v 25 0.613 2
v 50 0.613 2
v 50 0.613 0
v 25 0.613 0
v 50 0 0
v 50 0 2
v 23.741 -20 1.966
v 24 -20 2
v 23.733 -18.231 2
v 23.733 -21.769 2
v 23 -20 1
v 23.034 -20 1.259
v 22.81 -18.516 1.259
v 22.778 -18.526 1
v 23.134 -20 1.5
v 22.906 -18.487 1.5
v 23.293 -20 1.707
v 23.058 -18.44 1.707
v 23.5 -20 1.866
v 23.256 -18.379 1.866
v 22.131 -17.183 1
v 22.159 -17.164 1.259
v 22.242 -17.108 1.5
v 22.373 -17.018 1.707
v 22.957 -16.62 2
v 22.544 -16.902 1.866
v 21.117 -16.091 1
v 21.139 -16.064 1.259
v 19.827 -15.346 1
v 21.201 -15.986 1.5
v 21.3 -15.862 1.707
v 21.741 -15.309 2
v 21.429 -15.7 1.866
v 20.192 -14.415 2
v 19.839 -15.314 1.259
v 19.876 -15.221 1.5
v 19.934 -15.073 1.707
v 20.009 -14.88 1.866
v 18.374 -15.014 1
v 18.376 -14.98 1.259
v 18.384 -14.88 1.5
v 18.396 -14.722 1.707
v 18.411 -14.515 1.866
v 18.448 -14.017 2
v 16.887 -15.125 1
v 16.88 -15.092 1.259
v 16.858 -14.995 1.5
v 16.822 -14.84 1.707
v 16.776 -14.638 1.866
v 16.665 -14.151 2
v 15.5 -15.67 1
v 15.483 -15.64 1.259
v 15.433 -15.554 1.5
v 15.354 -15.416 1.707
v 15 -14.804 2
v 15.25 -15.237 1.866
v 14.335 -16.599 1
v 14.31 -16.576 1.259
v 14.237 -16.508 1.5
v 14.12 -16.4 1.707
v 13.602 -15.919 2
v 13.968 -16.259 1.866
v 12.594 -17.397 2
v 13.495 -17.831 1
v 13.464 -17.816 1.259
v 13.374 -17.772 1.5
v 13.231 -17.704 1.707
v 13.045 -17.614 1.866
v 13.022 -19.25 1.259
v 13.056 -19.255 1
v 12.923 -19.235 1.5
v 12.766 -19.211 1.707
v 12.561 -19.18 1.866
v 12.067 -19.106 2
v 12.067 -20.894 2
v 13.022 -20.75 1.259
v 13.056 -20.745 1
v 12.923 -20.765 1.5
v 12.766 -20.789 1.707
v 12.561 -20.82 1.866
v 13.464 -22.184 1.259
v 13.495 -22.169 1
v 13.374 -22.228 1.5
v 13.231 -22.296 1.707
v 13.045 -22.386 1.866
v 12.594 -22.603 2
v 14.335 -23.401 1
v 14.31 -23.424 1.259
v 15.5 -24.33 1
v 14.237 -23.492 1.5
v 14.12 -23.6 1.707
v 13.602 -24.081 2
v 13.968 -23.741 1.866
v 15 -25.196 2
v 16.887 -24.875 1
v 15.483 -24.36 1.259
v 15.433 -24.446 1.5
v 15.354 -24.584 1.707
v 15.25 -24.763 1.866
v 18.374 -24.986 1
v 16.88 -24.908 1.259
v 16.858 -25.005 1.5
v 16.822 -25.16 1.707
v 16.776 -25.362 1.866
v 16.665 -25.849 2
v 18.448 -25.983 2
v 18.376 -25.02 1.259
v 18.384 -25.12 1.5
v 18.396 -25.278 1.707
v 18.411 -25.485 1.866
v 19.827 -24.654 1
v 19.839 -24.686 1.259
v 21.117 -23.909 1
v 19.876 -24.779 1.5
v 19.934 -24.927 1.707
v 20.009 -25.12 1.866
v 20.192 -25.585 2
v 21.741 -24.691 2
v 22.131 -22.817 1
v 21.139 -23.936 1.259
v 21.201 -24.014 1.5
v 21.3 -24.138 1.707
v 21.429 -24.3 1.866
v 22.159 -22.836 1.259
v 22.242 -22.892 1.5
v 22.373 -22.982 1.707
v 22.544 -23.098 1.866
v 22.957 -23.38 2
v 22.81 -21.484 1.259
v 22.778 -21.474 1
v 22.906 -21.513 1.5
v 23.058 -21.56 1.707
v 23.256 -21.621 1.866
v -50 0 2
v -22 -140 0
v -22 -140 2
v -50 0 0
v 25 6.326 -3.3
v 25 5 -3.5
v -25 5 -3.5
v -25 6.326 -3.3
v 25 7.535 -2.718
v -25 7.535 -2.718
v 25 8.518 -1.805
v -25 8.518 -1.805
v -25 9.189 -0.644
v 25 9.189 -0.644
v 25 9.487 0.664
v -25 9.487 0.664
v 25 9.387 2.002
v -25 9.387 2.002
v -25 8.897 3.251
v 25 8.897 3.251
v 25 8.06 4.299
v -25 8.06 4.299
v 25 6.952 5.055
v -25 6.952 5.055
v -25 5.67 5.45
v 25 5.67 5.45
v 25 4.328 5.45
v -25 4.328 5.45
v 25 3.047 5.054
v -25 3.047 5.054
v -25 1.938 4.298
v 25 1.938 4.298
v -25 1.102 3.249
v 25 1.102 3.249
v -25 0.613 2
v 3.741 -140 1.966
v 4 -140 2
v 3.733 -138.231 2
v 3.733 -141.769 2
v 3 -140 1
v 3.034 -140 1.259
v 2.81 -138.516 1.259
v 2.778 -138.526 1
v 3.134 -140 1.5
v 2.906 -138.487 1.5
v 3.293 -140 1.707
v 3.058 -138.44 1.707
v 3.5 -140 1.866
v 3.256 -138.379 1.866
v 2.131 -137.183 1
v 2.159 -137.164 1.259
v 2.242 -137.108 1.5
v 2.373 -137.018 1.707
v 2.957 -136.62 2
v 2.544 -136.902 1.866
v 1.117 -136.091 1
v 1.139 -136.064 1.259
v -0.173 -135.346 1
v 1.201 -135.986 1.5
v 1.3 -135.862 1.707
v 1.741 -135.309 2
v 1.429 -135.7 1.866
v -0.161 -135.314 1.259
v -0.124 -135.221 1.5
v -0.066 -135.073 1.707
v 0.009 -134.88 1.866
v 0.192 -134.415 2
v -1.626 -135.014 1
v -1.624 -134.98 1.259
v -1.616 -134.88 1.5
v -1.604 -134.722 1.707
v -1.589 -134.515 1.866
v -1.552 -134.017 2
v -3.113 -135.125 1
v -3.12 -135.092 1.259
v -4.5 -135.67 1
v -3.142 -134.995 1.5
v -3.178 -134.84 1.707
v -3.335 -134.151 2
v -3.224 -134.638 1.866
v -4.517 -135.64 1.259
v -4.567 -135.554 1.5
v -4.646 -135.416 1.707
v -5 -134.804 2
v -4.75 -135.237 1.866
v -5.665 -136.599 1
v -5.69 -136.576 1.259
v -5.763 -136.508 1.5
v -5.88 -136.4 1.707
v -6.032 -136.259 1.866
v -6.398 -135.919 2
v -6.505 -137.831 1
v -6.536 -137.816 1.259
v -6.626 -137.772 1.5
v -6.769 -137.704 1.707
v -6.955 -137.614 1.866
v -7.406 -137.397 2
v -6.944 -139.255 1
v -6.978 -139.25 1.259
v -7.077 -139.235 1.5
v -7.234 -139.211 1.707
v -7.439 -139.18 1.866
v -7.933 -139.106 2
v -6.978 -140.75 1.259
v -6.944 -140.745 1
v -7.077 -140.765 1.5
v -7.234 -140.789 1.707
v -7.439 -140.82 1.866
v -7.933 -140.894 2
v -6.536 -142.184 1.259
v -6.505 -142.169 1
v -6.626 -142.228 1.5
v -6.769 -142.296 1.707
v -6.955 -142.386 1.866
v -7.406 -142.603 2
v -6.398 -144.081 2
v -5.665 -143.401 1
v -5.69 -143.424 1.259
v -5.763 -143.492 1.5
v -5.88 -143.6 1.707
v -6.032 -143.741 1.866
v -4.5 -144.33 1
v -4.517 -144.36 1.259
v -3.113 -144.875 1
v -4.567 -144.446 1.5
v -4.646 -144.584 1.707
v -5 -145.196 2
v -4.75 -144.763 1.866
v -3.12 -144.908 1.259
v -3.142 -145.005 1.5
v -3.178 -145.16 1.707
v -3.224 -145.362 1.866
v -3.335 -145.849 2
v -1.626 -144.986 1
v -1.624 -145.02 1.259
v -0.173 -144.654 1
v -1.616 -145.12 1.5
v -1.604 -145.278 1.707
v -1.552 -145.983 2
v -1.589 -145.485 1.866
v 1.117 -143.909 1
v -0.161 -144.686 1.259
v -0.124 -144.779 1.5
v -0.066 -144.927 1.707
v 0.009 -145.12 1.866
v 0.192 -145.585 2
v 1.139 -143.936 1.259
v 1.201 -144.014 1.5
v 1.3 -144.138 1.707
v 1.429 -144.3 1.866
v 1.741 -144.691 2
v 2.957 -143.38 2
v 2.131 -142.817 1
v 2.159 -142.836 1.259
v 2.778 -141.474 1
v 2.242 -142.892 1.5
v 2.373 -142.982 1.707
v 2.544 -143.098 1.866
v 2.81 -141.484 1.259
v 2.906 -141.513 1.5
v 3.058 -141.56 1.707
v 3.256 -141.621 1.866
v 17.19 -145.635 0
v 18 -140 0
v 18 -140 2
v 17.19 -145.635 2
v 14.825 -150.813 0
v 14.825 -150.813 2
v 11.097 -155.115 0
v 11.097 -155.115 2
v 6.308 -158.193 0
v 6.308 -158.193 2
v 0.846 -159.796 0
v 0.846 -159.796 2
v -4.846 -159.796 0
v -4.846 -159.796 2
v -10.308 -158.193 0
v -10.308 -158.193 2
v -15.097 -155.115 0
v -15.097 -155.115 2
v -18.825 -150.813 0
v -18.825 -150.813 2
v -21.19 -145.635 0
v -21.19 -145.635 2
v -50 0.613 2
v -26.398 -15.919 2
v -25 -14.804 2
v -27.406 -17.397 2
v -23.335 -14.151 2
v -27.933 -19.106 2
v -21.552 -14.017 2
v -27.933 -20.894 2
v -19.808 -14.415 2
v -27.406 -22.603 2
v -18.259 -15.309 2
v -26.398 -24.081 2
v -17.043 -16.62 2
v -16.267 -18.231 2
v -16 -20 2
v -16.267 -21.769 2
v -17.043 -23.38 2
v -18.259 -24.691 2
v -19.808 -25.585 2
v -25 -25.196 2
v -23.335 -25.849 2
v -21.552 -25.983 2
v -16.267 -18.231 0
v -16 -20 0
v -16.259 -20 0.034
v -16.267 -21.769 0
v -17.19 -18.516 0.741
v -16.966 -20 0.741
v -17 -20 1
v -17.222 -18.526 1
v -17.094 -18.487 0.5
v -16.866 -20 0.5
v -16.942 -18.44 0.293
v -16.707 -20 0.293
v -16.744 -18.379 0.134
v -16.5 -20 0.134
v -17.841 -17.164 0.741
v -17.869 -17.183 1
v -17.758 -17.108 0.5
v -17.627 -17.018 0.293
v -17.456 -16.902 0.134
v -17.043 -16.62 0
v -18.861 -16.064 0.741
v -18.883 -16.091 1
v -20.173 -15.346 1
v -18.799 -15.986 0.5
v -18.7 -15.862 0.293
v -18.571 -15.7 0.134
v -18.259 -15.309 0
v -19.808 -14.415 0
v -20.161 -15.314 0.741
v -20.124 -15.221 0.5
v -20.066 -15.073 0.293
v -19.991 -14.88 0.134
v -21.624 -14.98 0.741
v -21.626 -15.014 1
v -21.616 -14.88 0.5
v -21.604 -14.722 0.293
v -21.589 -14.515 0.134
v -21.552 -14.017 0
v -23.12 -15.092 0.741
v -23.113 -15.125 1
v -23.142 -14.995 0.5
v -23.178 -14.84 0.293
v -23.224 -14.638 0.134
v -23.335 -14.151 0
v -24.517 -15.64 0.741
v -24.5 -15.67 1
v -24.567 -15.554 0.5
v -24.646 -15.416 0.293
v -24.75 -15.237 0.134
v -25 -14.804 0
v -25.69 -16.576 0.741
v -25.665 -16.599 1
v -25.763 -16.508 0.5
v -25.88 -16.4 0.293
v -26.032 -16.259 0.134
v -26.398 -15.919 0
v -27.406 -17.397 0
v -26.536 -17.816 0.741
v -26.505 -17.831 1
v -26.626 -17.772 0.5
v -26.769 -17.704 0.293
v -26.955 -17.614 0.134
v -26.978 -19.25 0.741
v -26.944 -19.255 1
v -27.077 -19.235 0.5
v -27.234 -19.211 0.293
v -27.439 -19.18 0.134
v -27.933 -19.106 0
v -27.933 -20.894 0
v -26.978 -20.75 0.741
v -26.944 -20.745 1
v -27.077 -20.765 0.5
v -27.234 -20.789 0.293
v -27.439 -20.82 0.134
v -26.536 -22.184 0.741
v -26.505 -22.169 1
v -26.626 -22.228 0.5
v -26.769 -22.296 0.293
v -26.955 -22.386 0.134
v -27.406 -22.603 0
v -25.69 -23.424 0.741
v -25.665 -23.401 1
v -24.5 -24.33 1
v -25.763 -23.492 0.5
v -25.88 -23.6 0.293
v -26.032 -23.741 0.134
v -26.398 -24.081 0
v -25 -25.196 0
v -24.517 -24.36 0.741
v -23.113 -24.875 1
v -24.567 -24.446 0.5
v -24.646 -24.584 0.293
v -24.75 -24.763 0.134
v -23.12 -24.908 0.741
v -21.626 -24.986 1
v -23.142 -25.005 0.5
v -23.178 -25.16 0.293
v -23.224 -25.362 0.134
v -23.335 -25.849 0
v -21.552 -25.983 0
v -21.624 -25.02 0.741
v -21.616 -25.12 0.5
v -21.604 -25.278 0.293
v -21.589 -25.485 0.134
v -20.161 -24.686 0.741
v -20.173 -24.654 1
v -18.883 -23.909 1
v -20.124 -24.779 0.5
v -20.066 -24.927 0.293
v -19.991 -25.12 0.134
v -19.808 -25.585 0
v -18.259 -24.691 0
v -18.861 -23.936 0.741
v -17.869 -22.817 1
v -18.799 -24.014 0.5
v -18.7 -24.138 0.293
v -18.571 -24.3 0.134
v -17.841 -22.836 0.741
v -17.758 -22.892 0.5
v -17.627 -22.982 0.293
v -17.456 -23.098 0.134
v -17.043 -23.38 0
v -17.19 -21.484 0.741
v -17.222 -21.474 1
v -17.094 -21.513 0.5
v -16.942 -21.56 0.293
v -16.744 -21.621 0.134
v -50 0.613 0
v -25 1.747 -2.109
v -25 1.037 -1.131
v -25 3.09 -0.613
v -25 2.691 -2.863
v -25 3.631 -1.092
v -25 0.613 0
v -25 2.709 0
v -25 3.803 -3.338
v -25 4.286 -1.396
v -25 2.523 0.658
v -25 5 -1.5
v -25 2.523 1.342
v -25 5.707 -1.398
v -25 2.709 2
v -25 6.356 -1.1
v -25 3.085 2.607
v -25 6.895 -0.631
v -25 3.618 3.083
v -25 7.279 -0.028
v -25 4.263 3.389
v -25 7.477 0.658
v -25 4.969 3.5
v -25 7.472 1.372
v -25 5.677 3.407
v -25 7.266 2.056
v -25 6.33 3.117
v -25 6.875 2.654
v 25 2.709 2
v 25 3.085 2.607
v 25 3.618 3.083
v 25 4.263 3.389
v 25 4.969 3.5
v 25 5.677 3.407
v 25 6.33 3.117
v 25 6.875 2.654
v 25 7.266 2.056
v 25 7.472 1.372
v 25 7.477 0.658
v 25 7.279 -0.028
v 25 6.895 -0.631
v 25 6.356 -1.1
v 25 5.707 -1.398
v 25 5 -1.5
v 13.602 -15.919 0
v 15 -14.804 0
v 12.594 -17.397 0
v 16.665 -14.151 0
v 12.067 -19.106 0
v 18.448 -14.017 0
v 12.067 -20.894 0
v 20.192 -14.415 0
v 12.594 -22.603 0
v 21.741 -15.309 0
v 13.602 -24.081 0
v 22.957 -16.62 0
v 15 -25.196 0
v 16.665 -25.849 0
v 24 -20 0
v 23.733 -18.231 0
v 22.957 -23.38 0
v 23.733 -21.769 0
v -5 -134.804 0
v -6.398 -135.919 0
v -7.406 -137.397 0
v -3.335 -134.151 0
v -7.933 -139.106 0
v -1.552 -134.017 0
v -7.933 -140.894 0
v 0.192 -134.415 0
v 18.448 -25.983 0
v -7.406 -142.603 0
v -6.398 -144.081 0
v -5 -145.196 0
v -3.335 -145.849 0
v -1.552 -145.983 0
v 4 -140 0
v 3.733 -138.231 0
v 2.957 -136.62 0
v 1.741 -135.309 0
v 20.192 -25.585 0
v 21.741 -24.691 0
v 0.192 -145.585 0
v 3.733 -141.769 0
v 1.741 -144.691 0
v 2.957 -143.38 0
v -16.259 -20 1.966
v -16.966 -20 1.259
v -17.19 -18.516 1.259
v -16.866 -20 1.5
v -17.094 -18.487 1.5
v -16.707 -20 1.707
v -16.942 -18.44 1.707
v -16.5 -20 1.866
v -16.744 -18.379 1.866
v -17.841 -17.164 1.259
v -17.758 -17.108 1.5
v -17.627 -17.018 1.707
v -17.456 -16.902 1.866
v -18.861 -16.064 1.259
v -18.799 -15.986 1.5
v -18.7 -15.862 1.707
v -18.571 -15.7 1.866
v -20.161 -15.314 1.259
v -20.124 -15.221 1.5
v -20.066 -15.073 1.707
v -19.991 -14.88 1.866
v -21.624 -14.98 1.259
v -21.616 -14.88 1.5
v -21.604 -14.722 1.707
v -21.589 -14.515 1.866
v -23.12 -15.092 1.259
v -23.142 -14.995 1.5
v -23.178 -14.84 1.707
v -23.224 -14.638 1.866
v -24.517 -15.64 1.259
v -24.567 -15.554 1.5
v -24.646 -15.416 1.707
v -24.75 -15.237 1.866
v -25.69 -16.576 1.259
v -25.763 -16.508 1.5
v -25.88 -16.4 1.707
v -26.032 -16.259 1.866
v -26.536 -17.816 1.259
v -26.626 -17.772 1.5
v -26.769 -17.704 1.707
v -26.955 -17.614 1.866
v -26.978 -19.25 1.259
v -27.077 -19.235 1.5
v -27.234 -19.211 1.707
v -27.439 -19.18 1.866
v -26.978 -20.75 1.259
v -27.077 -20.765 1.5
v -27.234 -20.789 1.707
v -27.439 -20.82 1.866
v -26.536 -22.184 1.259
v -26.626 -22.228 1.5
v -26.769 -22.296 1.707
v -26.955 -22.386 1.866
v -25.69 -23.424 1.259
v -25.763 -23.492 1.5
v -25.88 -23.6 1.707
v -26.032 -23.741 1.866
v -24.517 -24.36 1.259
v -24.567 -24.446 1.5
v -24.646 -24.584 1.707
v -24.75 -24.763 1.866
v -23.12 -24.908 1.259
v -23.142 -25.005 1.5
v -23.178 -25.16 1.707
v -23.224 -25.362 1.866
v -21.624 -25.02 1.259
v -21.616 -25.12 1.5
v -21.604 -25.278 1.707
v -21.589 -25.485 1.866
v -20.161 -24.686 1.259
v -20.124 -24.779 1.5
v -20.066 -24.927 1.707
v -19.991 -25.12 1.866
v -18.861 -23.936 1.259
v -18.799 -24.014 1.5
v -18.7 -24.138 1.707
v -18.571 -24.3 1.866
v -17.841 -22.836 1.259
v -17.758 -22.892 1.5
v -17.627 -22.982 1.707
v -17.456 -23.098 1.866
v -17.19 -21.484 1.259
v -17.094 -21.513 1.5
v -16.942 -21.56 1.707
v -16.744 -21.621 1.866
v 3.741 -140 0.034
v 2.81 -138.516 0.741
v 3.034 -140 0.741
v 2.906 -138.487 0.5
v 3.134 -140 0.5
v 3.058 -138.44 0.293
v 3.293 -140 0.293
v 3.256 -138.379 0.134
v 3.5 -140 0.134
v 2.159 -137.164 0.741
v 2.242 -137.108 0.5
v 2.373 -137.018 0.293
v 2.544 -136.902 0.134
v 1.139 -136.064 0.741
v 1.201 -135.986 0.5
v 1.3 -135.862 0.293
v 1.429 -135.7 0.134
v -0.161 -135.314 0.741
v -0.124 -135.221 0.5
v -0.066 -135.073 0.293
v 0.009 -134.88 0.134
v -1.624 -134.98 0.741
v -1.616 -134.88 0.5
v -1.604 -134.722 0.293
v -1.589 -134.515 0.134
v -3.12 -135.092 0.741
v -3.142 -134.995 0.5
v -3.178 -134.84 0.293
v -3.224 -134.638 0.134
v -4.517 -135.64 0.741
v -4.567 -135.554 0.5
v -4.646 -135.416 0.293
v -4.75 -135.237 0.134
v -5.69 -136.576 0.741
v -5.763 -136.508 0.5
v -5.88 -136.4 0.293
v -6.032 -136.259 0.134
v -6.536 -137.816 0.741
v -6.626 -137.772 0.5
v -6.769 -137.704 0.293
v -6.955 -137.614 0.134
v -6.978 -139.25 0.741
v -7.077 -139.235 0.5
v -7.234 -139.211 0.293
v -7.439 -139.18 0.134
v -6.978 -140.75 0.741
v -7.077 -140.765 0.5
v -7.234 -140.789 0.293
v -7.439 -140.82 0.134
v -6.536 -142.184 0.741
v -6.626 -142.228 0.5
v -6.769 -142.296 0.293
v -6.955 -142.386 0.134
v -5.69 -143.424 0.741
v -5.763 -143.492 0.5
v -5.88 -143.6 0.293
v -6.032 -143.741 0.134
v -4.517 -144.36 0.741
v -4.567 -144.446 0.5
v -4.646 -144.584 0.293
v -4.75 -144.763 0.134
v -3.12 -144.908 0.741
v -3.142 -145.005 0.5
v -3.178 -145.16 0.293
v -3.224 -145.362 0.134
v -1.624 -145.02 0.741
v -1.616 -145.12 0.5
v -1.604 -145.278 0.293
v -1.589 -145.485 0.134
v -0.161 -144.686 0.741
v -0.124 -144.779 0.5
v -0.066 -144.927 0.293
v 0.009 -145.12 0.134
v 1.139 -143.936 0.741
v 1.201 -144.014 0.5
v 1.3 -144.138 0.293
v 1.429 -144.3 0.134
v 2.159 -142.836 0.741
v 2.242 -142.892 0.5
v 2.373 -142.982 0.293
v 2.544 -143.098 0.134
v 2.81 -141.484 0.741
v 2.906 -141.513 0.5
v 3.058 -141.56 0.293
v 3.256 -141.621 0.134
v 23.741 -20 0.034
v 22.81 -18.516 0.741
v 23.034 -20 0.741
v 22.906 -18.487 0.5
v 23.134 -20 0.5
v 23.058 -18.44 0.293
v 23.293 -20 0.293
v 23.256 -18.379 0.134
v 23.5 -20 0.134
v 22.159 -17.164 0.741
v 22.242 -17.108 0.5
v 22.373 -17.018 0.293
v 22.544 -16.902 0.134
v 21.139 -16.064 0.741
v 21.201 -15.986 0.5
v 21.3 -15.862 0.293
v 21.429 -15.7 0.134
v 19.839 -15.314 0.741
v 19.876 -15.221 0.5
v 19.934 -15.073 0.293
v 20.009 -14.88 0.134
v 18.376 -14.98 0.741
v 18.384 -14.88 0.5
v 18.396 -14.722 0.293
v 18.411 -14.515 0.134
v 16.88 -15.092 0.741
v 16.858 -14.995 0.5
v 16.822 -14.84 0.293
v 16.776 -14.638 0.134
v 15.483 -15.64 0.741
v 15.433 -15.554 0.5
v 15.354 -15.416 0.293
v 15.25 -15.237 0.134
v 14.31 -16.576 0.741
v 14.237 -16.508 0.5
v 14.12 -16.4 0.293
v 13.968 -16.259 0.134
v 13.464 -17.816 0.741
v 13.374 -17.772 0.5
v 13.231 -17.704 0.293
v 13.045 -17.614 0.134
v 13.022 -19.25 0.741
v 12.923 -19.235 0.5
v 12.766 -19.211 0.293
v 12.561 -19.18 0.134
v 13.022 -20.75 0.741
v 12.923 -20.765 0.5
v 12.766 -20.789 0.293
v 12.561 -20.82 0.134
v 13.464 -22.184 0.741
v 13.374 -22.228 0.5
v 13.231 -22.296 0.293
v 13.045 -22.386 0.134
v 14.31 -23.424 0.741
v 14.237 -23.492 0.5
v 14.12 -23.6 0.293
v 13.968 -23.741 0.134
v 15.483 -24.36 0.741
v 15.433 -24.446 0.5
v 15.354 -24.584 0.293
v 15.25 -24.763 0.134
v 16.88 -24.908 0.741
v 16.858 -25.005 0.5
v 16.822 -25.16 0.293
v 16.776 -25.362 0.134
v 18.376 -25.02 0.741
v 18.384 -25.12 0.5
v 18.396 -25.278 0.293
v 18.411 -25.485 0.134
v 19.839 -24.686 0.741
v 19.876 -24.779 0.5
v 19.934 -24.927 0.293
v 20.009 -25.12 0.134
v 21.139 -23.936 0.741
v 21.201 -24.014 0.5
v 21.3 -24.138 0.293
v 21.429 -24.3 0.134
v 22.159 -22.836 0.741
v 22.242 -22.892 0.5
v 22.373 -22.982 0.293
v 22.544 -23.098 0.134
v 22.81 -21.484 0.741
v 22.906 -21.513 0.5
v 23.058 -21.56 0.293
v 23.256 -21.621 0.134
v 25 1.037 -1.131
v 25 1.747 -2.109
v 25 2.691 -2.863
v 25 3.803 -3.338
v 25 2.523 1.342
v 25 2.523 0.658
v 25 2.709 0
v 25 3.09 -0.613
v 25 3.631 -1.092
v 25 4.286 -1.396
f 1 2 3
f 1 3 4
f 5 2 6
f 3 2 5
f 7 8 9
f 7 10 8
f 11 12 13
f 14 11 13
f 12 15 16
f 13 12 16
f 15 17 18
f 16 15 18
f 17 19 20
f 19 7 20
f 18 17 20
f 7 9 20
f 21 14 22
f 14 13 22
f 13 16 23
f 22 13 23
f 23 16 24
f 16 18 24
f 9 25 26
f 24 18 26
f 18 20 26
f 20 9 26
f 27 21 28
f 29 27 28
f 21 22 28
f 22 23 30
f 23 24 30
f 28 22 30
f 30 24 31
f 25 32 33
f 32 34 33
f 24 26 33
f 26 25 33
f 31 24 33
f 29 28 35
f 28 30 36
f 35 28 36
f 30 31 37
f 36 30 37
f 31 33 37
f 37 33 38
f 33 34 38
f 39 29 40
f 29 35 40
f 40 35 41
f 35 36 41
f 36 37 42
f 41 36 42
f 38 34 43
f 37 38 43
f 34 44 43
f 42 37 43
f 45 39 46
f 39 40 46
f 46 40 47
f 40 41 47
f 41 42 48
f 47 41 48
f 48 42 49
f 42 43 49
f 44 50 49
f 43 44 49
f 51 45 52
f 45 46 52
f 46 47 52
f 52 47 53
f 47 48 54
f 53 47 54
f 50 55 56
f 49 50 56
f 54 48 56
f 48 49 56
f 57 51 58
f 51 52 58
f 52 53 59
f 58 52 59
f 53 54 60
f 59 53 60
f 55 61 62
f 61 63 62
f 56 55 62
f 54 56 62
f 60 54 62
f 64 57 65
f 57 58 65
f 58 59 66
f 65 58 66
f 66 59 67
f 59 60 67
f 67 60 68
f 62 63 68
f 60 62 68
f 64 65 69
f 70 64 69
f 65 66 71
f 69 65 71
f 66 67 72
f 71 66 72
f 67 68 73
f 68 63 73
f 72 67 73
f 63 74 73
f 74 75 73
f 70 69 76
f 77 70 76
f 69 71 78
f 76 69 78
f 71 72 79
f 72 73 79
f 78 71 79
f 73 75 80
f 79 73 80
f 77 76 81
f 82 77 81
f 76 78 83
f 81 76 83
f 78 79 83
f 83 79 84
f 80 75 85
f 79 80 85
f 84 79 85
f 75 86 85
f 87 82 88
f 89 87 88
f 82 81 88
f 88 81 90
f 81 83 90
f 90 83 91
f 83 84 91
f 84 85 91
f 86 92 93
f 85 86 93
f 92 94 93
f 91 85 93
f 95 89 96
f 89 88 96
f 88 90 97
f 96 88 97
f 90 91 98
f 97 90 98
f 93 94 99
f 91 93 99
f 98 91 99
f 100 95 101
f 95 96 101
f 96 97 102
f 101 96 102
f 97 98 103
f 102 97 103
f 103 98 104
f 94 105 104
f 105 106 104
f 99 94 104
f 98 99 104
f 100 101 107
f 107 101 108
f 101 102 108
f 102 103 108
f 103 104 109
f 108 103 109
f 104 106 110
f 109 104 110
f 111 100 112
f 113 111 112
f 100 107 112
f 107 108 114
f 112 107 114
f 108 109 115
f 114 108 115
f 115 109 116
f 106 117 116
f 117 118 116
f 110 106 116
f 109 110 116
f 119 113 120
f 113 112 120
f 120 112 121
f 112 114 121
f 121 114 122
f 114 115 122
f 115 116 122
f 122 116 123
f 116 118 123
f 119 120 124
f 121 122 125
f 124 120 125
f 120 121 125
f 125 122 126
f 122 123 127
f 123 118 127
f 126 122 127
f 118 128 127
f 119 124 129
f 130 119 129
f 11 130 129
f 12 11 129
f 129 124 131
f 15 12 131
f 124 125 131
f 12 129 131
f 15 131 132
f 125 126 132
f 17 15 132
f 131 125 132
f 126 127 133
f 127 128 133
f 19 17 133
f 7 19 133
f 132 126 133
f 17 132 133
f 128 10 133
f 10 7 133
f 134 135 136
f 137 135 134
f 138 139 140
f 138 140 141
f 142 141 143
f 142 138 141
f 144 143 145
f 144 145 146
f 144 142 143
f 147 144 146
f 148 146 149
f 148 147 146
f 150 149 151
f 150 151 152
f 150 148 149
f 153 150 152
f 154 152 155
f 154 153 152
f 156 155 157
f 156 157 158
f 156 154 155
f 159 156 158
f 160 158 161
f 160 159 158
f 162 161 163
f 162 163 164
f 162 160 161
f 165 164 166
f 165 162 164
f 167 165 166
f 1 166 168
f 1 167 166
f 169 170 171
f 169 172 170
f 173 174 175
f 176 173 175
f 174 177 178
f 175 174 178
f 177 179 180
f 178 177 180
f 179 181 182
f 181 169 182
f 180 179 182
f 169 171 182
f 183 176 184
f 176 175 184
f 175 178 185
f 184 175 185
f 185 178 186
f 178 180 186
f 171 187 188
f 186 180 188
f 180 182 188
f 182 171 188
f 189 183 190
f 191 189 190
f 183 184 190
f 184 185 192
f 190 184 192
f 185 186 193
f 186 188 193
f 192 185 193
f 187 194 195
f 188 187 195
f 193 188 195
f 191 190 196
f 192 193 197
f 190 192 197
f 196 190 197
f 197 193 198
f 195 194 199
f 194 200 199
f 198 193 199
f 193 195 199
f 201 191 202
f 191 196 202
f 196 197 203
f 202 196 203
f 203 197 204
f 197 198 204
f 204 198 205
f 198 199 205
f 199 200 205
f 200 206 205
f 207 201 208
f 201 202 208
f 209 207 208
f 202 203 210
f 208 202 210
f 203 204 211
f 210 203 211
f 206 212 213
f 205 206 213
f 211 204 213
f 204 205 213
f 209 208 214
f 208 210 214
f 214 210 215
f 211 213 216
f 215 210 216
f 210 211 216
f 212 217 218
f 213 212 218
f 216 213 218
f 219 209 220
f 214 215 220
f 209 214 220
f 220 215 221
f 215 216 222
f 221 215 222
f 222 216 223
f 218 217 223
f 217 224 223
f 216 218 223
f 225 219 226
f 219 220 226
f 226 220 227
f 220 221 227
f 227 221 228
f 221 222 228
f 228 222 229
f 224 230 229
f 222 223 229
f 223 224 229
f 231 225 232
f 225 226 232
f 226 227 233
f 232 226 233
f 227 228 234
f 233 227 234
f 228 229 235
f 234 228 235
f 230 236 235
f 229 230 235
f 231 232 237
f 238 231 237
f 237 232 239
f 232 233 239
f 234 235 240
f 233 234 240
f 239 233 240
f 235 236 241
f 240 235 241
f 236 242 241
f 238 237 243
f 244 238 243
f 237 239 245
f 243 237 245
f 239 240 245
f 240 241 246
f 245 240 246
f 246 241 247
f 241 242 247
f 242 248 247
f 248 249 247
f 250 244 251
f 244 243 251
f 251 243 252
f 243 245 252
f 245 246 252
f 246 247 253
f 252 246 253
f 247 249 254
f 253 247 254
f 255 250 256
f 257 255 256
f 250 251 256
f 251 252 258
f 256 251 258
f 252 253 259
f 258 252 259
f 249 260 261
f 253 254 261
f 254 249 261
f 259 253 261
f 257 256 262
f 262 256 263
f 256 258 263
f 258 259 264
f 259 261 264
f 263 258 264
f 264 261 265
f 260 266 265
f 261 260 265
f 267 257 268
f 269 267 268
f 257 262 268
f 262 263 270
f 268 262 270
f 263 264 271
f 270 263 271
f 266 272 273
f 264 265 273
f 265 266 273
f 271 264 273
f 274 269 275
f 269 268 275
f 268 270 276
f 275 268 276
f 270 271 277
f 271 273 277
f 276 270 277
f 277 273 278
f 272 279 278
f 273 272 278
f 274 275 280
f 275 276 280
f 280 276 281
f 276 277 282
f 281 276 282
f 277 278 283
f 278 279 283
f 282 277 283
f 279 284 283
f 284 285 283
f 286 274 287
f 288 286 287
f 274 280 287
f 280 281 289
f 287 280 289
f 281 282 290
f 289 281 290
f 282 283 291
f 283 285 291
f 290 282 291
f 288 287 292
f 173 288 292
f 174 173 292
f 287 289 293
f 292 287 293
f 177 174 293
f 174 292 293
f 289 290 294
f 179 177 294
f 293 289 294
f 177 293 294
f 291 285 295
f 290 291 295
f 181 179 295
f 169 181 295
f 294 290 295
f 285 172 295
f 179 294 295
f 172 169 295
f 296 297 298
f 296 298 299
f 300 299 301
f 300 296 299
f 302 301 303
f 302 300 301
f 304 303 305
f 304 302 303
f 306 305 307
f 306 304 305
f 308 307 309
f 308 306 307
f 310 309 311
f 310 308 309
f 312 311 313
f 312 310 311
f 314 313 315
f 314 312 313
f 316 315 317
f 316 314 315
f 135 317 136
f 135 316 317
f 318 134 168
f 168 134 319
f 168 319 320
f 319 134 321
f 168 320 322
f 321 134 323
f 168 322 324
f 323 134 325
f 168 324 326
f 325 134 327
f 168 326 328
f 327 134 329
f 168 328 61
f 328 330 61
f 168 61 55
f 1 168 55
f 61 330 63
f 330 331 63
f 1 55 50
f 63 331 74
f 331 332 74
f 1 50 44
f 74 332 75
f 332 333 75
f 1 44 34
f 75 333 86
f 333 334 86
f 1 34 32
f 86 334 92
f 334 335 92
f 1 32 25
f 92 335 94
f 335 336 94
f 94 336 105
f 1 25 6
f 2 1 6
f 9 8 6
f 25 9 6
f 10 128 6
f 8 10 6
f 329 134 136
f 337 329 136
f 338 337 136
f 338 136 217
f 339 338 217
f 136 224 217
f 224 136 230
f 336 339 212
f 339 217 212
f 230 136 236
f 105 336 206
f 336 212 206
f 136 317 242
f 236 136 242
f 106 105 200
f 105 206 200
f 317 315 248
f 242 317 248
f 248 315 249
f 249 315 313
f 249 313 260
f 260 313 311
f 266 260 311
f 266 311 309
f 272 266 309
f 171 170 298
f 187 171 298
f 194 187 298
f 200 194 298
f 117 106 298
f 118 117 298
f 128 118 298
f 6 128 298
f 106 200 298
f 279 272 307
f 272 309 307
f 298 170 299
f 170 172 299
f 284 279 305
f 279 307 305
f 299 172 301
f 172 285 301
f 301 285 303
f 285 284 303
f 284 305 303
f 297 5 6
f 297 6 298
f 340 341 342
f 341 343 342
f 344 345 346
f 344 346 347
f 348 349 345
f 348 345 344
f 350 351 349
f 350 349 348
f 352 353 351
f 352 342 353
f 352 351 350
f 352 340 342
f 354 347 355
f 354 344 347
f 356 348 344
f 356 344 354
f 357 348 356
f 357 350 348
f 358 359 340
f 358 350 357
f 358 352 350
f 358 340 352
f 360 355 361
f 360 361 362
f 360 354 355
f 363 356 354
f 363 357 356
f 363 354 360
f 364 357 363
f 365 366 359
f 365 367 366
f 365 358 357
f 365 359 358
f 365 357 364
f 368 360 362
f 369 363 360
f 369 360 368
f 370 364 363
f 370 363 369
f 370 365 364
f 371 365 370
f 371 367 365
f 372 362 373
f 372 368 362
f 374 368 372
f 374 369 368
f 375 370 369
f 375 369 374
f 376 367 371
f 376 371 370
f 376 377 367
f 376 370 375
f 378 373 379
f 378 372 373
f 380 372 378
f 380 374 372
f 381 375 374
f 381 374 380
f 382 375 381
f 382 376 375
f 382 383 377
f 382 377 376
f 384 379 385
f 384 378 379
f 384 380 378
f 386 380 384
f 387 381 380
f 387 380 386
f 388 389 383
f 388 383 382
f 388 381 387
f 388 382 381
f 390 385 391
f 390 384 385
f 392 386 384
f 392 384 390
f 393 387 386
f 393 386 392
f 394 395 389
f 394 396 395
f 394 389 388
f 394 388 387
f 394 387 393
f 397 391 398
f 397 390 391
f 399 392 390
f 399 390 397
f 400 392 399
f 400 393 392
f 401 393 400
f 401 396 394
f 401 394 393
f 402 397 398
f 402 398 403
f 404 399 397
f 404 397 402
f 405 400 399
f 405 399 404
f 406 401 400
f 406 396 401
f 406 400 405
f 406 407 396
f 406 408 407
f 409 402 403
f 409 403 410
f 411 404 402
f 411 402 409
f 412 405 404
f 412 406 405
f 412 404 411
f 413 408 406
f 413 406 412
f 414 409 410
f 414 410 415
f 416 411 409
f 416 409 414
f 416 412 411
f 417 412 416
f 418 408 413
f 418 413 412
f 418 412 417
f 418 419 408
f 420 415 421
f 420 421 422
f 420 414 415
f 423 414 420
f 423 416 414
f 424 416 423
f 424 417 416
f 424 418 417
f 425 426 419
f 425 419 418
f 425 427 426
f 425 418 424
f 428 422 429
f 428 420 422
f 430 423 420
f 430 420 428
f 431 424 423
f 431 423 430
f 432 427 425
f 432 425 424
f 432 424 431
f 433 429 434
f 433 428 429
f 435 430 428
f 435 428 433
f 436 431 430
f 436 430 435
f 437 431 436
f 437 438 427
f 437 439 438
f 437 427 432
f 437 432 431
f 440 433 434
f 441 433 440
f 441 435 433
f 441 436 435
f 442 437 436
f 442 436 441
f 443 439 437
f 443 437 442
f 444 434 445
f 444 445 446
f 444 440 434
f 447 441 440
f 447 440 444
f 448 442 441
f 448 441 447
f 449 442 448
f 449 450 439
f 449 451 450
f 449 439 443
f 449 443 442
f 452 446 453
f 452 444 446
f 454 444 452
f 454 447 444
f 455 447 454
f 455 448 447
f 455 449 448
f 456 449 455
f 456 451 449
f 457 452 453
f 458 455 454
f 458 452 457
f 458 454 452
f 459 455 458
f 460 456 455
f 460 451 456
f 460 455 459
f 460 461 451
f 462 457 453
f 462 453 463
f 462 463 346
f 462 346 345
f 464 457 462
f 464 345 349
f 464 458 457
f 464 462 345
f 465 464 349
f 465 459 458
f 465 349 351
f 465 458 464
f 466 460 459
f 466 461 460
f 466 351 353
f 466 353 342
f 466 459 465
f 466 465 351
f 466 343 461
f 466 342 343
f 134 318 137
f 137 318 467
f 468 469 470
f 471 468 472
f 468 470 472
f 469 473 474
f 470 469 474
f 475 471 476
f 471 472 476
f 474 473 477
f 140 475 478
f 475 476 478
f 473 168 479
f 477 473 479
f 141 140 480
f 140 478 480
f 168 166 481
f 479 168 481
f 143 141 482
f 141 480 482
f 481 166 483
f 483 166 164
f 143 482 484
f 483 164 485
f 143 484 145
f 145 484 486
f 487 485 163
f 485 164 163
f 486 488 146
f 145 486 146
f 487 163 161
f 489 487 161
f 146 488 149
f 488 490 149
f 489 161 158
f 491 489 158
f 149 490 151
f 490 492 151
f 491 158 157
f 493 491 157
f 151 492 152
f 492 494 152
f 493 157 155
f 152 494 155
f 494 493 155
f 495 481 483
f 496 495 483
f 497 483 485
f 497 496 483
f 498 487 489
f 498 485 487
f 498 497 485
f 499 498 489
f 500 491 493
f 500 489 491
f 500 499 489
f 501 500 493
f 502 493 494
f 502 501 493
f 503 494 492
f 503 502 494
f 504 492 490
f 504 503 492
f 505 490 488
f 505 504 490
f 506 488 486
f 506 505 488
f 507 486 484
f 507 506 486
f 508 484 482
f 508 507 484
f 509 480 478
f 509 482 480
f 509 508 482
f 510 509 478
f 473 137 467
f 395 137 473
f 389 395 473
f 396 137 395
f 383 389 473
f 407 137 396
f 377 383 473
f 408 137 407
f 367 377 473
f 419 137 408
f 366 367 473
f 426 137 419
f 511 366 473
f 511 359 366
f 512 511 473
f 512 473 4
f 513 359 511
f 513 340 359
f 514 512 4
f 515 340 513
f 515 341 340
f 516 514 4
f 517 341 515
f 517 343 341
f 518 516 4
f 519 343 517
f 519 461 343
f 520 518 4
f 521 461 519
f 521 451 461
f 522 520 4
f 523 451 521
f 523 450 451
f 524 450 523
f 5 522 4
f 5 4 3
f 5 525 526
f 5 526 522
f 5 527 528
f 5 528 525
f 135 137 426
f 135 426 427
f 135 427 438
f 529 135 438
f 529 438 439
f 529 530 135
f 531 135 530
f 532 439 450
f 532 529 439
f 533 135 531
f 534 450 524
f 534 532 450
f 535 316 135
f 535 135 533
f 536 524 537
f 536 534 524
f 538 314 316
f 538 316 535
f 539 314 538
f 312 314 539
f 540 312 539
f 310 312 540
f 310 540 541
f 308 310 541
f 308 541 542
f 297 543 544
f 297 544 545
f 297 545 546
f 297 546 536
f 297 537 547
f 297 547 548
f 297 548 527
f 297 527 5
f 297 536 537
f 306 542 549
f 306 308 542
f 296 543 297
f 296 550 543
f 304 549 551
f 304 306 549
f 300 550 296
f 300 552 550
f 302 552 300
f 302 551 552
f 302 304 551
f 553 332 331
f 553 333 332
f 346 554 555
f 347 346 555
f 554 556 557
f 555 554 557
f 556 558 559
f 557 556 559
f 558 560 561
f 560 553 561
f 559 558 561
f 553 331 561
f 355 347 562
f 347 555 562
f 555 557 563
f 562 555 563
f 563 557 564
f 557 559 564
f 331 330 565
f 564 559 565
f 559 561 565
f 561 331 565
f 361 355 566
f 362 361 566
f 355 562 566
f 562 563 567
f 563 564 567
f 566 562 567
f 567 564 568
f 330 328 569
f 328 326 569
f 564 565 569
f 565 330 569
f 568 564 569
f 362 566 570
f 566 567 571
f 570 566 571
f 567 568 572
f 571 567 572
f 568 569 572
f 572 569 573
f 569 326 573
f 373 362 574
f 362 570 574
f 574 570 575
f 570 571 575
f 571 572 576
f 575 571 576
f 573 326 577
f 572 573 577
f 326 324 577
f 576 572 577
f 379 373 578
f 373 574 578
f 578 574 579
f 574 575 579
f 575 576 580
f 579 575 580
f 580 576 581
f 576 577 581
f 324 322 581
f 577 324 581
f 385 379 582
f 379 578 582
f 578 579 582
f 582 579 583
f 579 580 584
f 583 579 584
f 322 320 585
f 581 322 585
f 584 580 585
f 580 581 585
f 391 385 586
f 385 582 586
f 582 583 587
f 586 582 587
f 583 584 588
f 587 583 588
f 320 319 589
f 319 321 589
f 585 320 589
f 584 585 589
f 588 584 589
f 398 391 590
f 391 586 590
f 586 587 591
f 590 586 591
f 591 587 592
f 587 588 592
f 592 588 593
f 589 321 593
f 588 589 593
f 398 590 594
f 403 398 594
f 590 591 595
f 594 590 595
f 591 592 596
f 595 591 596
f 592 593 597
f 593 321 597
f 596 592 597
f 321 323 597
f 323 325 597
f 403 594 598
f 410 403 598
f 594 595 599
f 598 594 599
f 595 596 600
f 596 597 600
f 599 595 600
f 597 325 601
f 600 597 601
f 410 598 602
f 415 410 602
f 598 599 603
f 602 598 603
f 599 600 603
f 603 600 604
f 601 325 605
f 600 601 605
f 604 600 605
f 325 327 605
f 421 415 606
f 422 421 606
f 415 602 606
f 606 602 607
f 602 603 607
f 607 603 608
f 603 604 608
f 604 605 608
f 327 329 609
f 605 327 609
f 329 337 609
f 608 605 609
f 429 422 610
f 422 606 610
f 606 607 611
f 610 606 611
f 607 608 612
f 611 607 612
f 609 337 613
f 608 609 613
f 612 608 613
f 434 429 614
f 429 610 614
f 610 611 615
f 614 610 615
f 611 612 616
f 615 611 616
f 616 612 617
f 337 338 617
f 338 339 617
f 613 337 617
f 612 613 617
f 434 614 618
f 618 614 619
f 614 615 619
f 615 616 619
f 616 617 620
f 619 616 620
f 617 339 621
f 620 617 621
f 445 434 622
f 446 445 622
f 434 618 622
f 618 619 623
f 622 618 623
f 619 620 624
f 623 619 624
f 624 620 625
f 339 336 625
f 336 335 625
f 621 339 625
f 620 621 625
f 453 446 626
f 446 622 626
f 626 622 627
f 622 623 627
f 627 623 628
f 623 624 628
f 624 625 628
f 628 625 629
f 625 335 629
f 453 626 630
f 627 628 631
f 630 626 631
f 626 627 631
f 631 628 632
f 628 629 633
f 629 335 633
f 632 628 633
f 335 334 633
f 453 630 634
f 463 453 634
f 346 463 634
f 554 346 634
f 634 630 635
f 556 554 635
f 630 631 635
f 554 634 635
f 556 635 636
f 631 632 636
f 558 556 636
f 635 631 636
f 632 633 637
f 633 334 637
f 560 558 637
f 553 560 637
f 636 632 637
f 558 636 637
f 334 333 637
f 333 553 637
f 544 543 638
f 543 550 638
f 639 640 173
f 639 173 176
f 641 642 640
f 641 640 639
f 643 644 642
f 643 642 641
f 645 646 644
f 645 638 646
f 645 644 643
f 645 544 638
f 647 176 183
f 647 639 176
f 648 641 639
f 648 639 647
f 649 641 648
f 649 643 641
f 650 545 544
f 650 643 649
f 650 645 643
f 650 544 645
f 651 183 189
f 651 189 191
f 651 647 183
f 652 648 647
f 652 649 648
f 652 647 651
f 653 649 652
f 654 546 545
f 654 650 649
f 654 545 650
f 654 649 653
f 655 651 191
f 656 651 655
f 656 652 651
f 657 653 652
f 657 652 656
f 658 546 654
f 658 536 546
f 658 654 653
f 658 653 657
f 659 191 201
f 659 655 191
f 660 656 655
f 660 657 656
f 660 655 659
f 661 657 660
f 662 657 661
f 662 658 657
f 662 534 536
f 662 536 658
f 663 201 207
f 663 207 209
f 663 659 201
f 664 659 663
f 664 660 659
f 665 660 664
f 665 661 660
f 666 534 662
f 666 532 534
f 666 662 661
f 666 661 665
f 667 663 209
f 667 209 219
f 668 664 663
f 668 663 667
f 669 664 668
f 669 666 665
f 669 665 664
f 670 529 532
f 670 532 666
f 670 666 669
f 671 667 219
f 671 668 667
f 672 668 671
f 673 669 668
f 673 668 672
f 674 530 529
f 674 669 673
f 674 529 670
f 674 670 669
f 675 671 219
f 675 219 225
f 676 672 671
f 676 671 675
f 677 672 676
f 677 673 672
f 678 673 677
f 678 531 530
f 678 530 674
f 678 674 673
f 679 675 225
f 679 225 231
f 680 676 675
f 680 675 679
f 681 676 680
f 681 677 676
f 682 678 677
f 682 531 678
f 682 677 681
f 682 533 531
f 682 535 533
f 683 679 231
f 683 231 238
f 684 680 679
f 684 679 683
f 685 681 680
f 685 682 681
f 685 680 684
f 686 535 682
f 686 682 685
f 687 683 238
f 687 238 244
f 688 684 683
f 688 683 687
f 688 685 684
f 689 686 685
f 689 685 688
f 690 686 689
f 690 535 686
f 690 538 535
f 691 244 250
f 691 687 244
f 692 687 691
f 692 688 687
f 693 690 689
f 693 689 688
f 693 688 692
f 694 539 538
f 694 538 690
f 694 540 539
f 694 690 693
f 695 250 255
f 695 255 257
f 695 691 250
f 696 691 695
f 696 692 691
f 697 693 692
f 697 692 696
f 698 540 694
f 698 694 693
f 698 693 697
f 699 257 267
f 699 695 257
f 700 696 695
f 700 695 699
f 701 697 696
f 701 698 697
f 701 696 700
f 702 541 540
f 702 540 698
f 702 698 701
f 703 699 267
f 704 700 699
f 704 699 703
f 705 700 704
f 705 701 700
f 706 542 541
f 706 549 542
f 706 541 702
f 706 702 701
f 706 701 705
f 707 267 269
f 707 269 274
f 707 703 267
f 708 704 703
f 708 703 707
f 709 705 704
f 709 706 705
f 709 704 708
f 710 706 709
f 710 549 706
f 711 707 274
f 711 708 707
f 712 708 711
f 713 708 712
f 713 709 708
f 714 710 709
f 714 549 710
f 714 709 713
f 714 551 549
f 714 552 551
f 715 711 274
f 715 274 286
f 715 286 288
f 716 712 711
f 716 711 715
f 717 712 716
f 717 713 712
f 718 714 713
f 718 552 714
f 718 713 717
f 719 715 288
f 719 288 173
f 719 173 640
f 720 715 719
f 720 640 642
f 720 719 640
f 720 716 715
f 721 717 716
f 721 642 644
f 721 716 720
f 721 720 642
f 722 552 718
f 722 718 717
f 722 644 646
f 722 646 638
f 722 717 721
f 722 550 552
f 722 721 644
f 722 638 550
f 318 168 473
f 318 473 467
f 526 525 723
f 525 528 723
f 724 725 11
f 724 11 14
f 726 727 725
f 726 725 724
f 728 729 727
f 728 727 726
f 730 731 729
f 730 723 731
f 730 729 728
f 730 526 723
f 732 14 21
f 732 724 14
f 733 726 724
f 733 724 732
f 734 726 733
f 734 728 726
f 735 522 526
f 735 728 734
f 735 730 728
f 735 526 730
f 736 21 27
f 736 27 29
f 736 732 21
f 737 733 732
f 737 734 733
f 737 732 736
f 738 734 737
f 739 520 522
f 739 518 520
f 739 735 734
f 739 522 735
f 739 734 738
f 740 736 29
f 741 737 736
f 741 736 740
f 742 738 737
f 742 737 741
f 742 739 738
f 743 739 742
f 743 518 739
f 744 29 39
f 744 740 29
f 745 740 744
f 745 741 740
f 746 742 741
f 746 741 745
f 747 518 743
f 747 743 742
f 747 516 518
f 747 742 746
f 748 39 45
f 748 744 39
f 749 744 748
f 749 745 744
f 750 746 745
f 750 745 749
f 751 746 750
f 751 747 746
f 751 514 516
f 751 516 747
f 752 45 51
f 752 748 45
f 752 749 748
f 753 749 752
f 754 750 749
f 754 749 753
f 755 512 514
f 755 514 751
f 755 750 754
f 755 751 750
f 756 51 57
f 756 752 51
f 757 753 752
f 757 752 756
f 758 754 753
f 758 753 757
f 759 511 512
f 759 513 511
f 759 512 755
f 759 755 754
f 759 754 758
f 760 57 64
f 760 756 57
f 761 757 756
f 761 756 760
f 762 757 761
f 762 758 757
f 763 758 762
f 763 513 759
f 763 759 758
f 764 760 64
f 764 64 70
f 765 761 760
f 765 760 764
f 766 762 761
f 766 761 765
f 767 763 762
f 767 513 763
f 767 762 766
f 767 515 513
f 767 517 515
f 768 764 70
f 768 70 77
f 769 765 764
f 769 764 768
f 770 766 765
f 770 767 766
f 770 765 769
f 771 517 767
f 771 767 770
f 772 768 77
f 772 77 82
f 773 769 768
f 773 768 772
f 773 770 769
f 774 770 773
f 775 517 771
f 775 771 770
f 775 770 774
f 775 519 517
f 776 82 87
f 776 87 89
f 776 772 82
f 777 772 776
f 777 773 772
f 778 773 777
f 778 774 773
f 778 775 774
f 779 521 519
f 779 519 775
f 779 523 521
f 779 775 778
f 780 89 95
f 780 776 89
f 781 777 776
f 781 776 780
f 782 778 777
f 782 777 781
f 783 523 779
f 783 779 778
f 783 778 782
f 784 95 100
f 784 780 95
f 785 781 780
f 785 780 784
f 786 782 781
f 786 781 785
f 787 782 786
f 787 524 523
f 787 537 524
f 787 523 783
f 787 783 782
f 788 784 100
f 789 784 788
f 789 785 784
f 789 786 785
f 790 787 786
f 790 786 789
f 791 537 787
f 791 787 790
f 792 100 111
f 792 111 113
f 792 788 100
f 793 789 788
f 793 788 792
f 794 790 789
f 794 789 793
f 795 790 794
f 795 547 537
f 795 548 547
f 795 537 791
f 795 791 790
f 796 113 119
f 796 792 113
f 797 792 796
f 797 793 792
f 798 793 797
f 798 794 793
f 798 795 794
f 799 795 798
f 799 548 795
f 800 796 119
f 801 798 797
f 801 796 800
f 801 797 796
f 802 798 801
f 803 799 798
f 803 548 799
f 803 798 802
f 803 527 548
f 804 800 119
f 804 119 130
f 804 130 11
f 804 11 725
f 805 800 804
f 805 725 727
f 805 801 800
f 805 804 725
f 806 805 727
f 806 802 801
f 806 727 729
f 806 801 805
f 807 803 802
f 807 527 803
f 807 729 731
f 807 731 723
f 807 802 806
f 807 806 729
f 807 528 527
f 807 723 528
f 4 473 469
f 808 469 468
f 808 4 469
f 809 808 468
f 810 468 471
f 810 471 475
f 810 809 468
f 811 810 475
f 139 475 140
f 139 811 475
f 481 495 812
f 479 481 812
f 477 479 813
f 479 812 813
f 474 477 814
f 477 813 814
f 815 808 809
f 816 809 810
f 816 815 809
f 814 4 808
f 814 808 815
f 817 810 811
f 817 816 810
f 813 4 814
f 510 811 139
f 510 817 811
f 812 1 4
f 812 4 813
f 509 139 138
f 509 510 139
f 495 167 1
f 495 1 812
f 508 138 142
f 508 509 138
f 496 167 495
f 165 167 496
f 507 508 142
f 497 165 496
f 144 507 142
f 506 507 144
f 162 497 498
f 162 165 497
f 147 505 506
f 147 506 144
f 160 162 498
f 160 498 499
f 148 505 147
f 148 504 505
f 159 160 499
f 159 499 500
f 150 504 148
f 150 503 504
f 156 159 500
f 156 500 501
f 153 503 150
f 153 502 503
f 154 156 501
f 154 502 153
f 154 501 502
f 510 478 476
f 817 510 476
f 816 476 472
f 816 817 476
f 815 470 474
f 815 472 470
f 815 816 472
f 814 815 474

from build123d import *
from build123d.topology import SkipClean

# Parameters (mm, degrees)
ESBO_O1_R                  = 5
RESSALTO_EXTRUS_O1_DEPTH   = 2
FILETE1_R                  = 1
ESBO_O6_W                  = 100
ESBO_O6_H                  = 2
RESSALTO_EXTRUS_O2_DEPTH   = 5
RESSALTO_EXTRUS_O3_DEPTH   = 100
CORTE_EXTRUS_O1_DEPTH      = 189.759767959
CORTE_EXTRUS_O3_DEPTH      = 168.720750058
CORTE_EXTRUS_O3_DEPTH_BACK = 168.720750058
ESBO_O9_W                  = 25
ESBO_O9_H                  = 25


with BuildPart() as part:
    # Esboço1 → Ressalto-extrusão1 (new body)
    with BuildSketch(Plane.XY):
        with BuildLine():
            Line((-50, 0), (50, 0))
            Line((50, 0), (18, -140))
            ThreePointArc((18, -140), (-2, -160), (-22, -140))
            Line((-22, -140), (-50, 0))
        make_face()
        with Locations((-2, -140)):
            Circle(ESBO_O1_R, mode=Mode.SUBTRACT)
        with Locations((-22, -20)):
            Circle(ESBO_O1_R, mode=Mode.SUBTRACT)
        with Locations((18, -20)):
            Circle(ESBO_O1_R, mode=Mode.SUBTRACT)
    extrude(amount=RESSALTO_EXTRUS_O1_DEPTH)

    # Filete1
    filete1_edges = [part.edges().sort_by_distance(p)[0] for p in [
        (-27, -20, 0),
        (-27, -20, 2),
        (13, -20, 0),
        (13, -20, 2),
        (-7, -140, 0),
        (-7, -140, 2),
    ]]
    fillet(filete1_edges, radius=FILETE1_R - 0.0001)  # a hair under: the kernel refuses the full size

    # Esboço6 → Ressalto-extrusão2 (add)
    with BuildSketch(Plane(origin=(0, 0, 0), x_dir=(1, 0, 0), z_dir=(0, 1, 0))):
        with Locations((0, -1)):
            Rectangle(ESBO_O6_W, ESBO_O6_H)
    extrude(amount=RESSALTO_EXTRUS_O2_DEPTH)

    # Esboço7 → Ressalto-extrusão3 (add, through all)
    with BuildSketch(Plane(origin=(50, 0, 0), x_dir=(0, 0, -1), z_dir=(1, 0, 0))):
        with BuildLine():
            ThreePointArc((3.5, 5), (-3.80624304, 8.51781182), (-2, 0.612517806))
            Line((-2, 0.612517806), (-2, 2.708712153))
            ThreePointArc((-2, 2.708712153), (-2.369306394, 7.091650066), (1.5, 5))
            ThreePointArc((1.5, 5), (1.091650066, 3.630693606), (0, 2.708712153))
            Line((0, 2.708712153), (0, 0.612517806))
            ThreePointArc((0, 0.612517806), (2.51781182, 2.19375696), (3.5, 5))
        make_face()
        with BuildLine():
            Line((-2, 2.708712153), (-2, 0.612517806))
            ThreePointArc((-2, 0.612517806), (-1, 0.5), (0, 0.612517806))
            Line((0, 0.612517806), (0, 2.708712153))
            ThreePointArc((0, 2.708712153), (-1, 2.5), (-2, 2.708712153))
        make_face()
    extrude(amount=-RESSALTO_EXTRUS_O3_DEPTH)

    # Esboço8 → Corte-extrusão1 (cut, through all)
    with SkipClean():  # the faces are left unmerged after this step: merging them gives an invalid solid
        with BuildSketch(Plane(origin=(50, 0, 0), x_dir=(0, 0, -1), z_dir=(1, 0, 0))):
            with BuildLine():
                ThreePointArc((-2, 2.708712153), (-1, 7.5), (0, 2.708712153))
                Line((0, 2.708712153), (0, 5))
                Line((0, 5), (-2, 5))
                Line((-2, 5), (-2, 2.708712153))
            make_face()
            with BuildLine():
                Line((0, 5), (0, 2.708712153))
                ThreePointArc((0, 2.708712153), (1.091650066, 3.630693606), (1.5, 5))
                ThreePointArc((1.5, 5), (-2.369306394, 7.091650066), (-2, 2.708712153))
                Line((-2, 2.708712153), (-2, 5))
                Line((-2, 5), (0, 5))
            make_face()
            with BuildLine():
                ThreePointArc((-2, 2.708712153), (-1, 2.5), (0, 2.708712153))
                Line((0, 2.708712153), (0, 5))
                Line((0, 5), (-2, 5))
                Line((-2, 5), (-2, 2.708712153))
            make_face()
        extrude(amount=-CORTE_EXTRUS_O1_DEPTH, mode=Mode.SUBTRACT)

    # Esboço9 → Corte-extrusão3 (cut, two sides: drawn at the far end of the back side and taken through both)
    with BuildSketch(Plane(origin=(0, 0, 0), x_dir=(-1, 0, 0), z_dir=(0, 0, -1)).offset(-CORTE_EXTRUS_O3_DEPTH_BACK)):
        with Locations((-37.5, 13.112517806)):
            Rectangle(ESBO_O9_W, ESBO_O9_H)
        with Locations((37.5, 13.112517806)):
            Rectangle(ESBO_O9_W, ESBO_O9_H)
    extrude(amount=CORTE_EXTRUS_O3_DEPTH + CORTE_EXTRUS_O3_DEPTH_BACK, mode=Mode.SUBTRACT)


solid = part.part
